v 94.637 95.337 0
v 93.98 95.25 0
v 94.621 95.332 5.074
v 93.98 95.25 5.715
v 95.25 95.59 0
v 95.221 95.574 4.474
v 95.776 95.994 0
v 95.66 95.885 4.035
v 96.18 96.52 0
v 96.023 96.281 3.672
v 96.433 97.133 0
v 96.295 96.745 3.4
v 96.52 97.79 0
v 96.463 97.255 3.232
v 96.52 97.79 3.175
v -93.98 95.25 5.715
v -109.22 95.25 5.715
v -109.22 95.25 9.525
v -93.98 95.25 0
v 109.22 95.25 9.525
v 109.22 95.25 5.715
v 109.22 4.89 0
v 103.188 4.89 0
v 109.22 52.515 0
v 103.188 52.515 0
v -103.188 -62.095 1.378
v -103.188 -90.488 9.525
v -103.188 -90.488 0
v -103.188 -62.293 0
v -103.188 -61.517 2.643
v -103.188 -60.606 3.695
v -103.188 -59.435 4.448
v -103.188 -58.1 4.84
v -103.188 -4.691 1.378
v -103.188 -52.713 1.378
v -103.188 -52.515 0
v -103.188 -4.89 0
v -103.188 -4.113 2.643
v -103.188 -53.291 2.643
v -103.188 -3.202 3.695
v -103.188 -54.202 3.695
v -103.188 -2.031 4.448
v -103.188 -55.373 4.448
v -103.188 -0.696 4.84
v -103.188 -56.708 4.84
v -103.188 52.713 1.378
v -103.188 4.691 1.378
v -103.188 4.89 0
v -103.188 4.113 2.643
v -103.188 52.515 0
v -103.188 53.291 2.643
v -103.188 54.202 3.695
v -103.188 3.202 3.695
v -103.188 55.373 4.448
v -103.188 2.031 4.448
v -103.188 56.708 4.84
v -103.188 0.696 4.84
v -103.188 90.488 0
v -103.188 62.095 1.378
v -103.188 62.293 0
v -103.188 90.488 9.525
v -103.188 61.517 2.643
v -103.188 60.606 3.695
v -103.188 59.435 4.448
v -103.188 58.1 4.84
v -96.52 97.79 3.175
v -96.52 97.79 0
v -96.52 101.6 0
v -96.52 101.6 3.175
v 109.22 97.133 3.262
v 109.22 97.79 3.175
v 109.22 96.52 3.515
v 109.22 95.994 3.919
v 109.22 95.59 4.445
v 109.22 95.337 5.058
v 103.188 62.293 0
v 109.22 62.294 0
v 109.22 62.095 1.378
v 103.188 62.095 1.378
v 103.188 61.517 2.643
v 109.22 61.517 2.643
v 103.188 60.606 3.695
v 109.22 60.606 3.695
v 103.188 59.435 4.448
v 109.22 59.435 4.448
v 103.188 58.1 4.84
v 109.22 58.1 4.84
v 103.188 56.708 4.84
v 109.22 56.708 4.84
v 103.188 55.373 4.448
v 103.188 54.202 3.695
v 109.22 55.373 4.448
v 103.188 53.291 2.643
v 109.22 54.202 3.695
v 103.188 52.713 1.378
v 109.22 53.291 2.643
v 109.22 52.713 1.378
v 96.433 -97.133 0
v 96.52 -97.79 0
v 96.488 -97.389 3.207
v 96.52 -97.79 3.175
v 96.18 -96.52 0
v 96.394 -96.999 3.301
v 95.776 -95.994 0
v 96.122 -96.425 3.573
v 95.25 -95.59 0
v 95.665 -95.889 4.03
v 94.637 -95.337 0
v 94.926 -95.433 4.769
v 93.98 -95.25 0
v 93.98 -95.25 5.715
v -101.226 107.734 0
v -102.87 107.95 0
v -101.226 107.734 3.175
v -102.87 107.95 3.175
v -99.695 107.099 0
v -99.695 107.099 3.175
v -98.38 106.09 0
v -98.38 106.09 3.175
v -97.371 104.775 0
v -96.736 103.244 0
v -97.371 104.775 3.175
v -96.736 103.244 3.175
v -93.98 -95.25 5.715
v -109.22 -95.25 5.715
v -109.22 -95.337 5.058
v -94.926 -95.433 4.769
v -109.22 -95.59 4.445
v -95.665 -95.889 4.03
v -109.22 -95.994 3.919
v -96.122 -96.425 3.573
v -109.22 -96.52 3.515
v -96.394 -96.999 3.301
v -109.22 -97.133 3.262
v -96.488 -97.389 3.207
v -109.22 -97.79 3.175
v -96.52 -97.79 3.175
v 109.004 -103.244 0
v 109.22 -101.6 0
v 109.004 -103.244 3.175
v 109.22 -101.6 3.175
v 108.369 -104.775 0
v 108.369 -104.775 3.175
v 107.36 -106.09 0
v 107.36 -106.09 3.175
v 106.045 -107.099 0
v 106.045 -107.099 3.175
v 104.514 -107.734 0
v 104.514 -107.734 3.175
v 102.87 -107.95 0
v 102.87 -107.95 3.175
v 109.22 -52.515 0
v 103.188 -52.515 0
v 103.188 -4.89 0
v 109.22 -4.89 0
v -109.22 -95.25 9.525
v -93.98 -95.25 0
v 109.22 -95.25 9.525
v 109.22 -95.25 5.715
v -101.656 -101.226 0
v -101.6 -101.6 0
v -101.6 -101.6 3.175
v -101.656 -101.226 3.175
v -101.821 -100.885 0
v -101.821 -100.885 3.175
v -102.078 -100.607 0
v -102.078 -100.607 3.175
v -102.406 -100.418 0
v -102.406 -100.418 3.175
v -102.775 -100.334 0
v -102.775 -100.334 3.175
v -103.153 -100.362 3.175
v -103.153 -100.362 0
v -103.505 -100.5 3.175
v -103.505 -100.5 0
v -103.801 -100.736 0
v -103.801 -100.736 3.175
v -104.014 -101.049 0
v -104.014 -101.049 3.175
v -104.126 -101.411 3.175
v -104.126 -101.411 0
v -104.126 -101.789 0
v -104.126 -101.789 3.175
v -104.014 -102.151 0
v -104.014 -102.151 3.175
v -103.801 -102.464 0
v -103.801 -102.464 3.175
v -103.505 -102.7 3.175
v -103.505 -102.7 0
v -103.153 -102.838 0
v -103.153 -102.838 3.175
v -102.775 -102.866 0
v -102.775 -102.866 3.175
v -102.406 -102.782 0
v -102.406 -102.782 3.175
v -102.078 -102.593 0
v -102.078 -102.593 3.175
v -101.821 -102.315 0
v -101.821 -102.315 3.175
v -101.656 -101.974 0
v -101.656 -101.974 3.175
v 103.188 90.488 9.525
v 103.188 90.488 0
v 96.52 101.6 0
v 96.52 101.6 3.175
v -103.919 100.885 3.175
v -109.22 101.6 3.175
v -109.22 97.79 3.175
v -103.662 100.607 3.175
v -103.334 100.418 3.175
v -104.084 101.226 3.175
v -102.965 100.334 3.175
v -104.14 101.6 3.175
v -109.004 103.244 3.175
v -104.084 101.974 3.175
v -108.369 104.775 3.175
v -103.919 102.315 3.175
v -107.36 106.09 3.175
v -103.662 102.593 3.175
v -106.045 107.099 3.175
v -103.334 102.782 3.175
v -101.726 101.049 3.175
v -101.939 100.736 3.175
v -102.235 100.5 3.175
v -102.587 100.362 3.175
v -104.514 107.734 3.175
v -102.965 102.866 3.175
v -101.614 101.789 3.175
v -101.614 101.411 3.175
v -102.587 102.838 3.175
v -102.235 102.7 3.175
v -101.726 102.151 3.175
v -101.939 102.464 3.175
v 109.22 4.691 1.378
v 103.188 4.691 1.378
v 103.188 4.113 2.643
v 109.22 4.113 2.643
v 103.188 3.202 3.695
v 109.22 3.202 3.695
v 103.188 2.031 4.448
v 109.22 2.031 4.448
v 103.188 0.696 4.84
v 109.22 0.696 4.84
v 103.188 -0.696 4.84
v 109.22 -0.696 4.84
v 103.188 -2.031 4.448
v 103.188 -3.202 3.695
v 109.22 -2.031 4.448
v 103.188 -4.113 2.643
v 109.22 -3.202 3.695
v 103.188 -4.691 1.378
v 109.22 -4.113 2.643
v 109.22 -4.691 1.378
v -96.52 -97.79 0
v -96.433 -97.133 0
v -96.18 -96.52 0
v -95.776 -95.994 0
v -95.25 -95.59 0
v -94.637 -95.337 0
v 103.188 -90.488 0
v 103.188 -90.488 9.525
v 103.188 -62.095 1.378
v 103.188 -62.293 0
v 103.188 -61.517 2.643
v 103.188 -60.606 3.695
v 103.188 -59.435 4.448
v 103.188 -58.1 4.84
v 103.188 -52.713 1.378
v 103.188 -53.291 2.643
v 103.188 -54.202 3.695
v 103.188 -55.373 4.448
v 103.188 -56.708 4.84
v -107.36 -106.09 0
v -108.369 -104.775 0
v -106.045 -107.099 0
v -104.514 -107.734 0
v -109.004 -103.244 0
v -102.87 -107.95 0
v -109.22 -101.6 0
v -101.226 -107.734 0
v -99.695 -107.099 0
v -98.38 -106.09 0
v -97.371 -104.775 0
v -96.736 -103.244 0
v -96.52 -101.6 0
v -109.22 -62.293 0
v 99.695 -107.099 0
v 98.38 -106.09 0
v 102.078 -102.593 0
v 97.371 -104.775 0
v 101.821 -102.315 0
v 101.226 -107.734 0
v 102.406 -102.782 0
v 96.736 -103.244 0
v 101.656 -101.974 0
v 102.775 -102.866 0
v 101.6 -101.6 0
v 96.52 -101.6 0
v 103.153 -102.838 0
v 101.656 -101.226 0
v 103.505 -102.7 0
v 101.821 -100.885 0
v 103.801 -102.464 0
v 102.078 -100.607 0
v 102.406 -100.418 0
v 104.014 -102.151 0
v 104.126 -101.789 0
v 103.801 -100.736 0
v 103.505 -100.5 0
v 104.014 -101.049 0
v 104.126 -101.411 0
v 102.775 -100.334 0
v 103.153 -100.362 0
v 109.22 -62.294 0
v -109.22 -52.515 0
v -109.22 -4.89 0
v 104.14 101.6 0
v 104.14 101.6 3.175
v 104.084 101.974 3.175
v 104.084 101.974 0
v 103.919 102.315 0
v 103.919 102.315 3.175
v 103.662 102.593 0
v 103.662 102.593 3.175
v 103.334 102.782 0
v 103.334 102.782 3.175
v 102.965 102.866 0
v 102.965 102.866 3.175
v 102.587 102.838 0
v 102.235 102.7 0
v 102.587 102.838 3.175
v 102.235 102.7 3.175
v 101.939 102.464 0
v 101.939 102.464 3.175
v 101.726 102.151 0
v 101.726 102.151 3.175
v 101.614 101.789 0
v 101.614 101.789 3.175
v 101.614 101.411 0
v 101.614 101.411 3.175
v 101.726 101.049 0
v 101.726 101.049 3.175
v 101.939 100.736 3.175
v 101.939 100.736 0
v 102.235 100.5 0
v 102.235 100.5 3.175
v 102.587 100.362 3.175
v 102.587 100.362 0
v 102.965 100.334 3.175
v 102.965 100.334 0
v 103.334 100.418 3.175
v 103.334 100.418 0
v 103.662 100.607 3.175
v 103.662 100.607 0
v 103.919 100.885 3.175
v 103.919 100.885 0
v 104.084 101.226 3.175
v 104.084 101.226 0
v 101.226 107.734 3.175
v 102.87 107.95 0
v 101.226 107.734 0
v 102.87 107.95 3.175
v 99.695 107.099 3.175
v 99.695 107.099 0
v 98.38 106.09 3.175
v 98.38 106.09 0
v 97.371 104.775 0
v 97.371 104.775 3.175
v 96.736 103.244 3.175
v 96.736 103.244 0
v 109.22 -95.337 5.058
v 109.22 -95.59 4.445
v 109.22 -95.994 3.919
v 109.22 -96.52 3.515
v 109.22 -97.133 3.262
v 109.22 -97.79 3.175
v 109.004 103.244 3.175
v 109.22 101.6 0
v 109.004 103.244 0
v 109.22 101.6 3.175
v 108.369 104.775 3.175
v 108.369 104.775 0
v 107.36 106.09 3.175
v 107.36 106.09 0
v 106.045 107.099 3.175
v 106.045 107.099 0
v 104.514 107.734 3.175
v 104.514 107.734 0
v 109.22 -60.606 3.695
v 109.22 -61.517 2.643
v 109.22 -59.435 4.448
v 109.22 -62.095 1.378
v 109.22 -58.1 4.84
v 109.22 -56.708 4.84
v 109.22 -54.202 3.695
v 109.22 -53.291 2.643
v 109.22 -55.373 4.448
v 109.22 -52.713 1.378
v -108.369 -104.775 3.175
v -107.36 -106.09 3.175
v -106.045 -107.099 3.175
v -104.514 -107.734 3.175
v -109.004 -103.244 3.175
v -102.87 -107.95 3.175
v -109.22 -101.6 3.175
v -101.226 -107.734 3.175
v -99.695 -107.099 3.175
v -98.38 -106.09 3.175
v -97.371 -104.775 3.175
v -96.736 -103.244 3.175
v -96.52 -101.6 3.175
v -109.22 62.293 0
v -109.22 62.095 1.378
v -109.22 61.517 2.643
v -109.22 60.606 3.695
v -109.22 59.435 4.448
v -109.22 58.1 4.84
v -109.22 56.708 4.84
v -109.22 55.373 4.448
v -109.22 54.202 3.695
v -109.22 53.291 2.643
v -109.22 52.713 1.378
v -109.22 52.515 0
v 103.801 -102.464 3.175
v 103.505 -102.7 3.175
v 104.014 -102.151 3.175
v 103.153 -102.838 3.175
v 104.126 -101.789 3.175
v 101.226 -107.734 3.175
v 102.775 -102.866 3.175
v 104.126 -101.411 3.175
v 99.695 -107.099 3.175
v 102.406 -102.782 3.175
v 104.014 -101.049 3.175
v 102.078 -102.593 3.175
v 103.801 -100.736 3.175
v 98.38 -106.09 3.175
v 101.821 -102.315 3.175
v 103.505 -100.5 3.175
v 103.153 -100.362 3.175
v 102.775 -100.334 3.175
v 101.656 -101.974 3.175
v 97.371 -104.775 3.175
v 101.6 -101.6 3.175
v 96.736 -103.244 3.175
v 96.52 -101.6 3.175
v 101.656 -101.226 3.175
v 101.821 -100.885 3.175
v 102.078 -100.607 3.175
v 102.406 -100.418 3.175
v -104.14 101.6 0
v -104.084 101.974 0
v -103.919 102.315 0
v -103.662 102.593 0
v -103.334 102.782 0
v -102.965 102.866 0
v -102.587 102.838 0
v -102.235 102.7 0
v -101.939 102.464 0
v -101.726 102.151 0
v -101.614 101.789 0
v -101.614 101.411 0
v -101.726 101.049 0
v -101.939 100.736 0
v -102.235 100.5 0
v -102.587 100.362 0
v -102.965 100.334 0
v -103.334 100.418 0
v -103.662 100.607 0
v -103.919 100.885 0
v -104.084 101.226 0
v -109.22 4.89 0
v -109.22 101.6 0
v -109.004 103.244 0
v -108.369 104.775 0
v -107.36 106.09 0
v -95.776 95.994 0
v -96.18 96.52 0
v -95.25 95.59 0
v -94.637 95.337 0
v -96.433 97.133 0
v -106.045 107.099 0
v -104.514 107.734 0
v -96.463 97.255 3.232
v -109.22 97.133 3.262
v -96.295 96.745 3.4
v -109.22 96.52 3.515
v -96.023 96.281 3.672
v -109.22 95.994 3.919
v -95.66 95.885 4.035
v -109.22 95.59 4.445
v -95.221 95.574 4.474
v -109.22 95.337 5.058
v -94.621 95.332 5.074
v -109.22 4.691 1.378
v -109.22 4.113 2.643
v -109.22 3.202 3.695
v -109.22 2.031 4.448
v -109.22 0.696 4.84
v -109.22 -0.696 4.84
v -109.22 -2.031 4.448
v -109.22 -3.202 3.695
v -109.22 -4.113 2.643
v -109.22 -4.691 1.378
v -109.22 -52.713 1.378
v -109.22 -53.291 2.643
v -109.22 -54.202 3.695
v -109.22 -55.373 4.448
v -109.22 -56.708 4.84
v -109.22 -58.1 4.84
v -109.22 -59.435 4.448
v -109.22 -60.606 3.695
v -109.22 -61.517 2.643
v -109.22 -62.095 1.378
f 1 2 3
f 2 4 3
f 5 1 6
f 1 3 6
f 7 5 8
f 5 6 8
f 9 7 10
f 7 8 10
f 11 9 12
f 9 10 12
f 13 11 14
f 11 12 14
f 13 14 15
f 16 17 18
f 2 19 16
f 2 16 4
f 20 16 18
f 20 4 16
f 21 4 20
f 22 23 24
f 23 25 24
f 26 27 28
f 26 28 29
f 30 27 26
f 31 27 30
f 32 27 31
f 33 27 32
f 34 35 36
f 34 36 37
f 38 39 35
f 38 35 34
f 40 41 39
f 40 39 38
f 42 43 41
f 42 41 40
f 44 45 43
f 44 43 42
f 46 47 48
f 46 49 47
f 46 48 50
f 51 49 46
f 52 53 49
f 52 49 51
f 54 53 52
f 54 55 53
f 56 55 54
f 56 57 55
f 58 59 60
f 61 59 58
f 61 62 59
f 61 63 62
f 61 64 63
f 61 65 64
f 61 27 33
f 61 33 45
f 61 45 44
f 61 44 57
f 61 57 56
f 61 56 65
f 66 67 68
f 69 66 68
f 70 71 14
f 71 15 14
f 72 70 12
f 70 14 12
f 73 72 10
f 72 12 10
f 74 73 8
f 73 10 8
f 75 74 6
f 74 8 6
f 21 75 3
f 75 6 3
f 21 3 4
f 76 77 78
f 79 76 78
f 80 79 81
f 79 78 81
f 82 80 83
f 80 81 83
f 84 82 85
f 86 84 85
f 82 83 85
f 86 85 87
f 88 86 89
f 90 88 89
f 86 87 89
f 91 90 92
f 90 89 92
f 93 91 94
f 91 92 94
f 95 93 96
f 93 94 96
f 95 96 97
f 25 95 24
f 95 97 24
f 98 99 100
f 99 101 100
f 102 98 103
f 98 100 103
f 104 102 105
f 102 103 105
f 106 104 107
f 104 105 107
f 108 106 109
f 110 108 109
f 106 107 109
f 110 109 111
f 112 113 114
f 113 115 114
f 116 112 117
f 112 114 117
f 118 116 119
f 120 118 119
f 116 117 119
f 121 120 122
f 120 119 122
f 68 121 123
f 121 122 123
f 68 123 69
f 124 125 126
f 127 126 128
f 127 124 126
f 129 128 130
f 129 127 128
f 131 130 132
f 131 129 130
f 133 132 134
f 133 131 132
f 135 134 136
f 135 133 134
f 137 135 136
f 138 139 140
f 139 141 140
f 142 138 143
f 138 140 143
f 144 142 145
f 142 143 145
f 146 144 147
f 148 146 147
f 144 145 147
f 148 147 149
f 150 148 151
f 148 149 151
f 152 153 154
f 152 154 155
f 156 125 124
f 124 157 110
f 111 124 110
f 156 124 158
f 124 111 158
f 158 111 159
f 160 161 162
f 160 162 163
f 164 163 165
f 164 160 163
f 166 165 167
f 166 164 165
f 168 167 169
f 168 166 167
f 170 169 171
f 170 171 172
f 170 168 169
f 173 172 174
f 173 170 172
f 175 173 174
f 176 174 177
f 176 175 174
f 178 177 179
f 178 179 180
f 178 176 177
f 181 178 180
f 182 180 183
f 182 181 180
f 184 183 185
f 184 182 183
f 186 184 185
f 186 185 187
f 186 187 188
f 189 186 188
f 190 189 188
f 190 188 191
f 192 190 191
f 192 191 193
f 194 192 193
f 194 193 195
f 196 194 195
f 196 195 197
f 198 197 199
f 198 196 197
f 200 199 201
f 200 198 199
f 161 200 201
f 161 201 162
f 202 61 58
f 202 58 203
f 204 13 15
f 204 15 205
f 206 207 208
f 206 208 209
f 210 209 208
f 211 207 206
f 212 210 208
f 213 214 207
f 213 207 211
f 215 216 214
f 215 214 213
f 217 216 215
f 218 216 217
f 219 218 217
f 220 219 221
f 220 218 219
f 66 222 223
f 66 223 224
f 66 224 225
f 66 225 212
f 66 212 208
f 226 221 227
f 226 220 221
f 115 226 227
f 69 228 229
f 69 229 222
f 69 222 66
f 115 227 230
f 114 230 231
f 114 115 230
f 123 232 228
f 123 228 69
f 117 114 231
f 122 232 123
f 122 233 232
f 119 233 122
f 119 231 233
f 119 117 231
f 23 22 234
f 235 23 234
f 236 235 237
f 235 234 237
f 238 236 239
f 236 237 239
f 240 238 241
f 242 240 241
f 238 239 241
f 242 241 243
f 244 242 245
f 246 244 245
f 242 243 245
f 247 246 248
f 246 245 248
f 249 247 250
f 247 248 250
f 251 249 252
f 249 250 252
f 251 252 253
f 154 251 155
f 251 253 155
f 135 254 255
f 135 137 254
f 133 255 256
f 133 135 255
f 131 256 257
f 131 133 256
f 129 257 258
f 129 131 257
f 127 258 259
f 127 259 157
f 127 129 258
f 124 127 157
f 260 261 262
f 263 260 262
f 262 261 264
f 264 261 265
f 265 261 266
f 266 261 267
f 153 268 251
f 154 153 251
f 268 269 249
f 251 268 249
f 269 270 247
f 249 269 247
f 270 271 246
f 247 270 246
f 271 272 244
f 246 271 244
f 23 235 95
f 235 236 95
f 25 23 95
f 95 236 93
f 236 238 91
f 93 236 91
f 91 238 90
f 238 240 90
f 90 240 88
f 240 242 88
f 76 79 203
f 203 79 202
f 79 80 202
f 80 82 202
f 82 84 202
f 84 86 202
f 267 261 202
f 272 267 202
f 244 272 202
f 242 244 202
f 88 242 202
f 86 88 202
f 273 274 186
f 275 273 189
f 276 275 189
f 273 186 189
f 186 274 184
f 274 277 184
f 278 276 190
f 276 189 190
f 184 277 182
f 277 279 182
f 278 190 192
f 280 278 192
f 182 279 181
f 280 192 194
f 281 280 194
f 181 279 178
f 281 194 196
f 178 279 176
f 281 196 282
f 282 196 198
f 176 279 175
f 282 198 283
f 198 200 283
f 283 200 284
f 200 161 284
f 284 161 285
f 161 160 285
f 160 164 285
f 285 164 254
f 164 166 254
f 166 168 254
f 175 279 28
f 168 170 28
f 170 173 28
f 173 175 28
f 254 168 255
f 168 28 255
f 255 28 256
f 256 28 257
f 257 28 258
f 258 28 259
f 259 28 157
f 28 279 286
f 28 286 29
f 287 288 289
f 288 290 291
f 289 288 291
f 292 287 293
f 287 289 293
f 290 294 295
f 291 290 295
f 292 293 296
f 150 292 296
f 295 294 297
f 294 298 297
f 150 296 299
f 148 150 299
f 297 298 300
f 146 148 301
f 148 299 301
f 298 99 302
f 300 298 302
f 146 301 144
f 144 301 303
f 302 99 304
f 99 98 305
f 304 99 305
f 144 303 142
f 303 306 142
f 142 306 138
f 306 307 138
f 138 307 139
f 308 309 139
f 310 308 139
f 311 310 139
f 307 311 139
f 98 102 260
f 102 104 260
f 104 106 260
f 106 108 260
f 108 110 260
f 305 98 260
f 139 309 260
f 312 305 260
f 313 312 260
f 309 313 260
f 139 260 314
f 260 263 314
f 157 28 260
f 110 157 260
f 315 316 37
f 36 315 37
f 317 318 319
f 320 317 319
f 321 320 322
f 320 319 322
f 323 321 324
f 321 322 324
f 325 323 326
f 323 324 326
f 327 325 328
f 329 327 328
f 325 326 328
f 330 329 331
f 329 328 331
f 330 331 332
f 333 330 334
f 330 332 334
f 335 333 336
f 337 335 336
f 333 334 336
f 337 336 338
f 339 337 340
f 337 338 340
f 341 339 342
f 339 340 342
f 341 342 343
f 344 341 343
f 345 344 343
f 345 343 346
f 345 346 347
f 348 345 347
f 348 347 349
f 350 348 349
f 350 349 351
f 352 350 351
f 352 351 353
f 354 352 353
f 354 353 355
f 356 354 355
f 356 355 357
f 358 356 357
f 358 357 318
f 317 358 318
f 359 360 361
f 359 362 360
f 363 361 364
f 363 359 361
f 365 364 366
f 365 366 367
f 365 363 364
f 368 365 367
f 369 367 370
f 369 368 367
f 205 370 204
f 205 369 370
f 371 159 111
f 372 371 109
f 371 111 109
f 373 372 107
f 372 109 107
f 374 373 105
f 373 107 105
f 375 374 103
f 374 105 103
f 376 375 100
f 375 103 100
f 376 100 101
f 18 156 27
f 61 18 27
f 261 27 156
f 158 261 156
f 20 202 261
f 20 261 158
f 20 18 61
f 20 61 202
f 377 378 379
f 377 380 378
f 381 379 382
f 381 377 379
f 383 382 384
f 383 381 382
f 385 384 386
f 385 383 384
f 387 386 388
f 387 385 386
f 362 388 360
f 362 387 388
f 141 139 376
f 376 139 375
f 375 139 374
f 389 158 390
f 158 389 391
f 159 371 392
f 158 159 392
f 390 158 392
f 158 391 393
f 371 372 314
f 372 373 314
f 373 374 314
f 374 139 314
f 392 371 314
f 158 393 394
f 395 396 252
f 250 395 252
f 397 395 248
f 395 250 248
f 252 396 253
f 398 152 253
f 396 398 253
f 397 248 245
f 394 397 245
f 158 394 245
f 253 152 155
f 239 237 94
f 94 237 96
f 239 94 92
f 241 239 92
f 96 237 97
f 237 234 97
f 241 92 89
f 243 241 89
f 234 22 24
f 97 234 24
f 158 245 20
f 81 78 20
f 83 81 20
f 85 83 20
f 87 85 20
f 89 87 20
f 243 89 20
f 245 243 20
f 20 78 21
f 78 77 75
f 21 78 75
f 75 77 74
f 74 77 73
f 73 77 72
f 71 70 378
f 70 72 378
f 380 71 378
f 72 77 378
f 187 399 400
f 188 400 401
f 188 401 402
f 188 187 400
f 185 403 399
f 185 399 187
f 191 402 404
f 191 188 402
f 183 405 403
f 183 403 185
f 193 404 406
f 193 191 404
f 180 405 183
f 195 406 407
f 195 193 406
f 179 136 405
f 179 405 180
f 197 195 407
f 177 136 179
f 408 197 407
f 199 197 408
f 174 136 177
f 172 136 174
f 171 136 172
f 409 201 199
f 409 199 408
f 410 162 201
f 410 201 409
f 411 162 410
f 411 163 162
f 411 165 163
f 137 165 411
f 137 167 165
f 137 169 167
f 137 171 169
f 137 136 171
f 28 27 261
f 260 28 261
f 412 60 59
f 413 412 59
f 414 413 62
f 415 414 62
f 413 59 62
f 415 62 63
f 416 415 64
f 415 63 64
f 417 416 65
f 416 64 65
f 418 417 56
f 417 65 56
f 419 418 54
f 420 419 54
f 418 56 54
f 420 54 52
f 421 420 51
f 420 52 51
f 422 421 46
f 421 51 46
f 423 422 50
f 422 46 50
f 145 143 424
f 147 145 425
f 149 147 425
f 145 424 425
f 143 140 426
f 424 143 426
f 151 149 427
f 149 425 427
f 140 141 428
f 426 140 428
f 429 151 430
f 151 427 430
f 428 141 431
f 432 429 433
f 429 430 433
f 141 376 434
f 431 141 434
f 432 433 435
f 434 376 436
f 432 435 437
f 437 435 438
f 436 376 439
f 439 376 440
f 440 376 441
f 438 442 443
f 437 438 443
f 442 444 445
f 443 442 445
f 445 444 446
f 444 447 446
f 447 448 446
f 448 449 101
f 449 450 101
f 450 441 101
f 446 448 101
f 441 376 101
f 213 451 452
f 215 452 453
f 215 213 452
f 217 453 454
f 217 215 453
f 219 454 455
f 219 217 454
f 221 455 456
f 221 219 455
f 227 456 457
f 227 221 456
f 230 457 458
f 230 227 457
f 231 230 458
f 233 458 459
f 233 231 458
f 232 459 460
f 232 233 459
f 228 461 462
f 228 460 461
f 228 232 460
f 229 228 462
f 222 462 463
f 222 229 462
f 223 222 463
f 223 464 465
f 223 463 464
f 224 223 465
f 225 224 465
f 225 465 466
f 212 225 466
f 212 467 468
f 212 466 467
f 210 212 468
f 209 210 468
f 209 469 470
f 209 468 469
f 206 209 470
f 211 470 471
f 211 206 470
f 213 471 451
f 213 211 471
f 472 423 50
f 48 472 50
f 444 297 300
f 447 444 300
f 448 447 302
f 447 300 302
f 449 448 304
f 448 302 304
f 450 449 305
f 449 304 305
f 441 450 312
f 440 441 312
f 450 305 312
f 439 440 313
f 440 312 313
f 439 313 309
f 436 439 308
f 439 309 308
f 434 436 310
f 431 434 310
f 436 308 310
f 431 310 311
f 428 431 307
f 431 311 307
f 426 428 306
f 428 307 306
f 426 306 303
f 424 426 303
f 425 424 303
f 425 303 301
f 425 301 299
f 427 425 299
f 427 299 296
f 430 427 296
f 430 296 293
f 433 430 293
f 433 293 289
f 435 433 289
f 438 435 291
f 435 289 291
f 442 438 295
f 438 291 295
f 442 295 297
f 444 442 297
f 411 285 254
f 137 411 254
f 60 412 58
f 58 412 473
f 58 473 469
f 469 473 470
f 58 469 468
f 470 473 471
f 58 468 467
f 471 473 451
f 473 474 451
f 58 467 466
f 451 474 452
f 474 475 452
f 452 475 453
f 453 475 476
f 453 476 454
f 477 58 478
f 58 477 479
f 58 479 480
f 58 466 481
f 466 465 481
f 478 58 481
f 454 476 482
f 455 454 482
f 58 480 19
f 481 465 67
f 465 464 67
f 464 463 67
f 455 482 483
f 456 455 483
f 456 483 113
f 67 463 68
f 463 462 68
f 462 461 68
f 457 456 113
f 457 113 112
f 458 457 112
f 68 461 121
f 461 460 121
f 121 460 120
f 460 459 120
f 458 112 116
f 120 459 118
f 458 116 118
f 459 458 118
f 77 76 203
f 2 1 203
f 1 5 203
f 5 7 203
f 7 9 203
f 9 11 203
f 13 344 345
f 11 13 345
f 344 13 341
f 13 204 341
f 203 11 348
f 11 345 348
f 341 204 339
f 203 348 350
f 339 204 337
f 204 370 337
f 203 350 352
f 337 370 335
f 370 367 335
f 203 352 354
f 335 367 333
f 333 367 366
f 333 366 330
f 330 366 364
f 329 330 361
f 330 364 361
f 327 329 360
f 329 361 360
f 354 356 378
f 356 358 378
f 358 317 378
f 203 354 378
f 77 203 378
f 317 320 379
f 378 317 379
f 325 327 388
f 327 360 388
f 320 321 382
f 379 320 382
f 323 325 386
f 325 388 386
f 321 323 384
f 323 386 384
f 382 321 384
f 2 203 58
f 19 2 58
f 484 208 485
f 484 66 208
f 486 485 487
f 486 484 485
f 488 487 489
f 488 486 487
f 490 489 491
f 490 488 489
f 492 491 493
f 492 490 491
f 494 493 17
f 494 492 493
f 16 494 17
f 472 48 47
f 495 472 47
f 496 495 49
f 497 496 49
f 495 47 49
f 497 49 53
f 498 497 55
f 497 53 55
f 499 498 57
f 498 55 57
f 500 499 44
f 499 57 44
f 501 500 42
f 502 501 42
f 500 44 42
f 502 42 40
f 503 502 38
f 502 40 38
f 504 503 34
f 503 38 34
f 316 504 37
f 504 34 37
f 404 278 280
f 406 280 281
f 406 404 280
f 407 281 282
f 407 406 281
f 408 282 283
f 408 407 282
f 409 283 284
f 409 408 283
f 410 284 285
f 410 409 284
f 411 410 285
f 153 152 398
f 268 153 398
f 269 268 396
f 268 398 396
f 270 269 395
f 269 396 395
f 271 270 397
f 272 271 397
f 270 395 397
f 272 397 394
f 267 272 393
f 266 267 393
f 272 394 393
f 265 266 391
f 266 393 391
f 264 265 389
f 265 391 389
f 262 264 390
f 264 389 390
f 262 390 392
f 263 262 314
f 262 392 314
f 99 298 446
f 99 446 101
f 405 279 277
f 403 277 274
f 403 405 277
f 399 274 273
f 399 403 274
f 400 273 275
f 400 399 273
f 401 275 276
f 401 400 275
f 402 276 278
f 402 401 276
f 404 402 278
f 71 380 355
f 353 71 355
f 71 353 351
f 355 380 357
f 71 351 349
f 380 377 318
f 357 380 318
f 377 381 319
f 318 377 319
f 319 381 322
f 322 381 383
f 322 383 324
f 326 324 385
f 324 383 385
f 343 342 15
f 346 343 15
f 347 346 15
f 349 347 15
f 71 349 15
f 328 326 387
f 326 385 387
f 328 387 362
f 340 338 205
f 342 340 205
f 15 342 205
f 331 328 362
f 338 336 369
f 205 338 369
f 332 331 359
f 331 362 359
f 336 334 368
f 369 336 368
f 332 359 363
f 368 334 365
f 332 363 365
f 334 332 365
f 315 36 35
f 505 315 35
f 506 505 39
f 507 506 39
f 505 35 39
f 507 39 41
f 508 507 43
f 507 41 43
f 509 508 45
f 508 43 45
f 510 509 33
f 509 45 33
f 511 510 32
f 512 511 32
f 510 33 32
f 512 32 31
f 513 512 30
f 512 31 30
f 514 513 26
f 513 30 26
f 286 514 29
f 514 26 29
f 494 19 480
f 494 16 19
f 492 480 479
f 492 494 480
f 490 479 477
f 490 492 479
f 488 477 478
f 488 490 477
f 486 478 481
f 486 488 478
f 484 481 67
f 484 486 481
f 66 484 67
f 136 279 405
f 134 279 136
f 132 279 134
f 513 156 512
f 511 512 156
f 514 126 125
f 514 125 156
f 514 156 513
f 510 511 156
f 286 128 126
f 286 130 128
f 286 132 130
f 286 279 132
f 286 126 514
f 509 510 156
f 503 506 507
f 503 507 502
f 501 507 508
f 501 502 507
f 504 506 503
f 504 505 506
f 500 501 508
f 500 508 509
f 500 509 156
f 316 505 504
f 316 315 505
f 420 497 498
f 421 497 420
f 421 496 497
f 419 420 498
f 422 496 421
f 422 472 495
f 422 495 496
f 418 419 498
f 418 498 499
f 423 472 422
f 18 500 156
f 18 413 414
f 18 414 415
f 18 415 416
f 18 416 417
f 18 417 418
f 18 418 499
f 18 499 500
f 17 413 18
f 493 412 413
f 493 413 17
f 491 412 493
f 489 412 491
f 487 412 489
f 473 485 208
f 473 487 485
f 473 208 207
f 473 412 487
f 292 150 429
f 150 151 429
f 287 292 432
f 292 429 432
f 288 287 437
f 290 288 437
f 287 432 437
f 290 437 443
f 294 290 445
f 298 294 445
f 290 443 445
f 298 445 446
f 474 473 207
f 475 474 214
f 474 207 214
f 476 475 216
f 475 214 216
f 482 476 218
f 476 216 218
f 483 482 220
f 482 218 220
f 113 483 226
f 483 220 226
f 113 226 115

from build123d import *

# Parameters (mm, degrees)
SKETCH1_W            = 218.44
SKETCH1_H            = 190.5
BOSS_EXTRUDE1_DEPTH  = 9.525
SKETCH2_W            = 206.375
SKETCH2_H            = 180.975
CUT_EXTRUDE1_DEPTH   = 9.525
SKETCH3_R            = 4.8895
CUT_EXTRUDE2_DEPTH   = 239.49386098
SKETCH4_W            = 12.7
SKETCH4_H            = 12.7
BOSS_EXTRUDE2_DEPTH  = 3.175
SKETCH5_R            = 1.27
CUT_EXTRUDE3_DEPTH   = 154.69623743
FILLET1_R            = 6.35
FILLET2_R            = 2.54
FILLET1_OF_MIRROR1_R = 6.35
FILLET2_OF_MIRROR1_R = 2.54
SKETCH6_W            = 12.7
SKETCH6_H            = 12.7
SKETCH6_R            = 1.27
BOSS_EXTRUDE3_DEPTH  = 3.175
FILLET3_R            = 2.54
FILLET4_R            = 6.35
FILLET3_OF_MIRROR7_R = 2.54
FILLET4_OF_MIRROR7_R = 6.35


with BuildPart() as part:
    # Sketch1 → Boss-Extrude1 (new body)
    with BuildSketch(Plane.XY):
        Rectangle(SKETCH1_W, SKETCH1_H)
    extrude(amount=BOSS_EXTRUDE1_DEPTH)

    # Sketch2 → Cut-Extrude1 (cut)
    with BuildSketch(Plane.XY.offset(9.525)):
        Rectangle(SKETCH2_W, SKETCH2_H)
    extrude(amount=-CUT_EXTRUDE1_DEPTH, mode=Mode.SUBTRACT)

    # Sketch3 → Cut-Extrude2 (cut, through all)
    with BuildSketch(Plane(origin=(109.22, 0, 0), x_dir=(0, 0, -1), z_dir=(1, 0, 0))):
        Circle(SKETCH3_R)
        with Locations((0, 57.404)):
            Circle(SKETCH3_R)
        with Locations((0, -57.404)):
            Circle(SKETCH3_R)
    extrude(amount=-CUT_EXTRUDE2_DEPTH, mode=Mode.SUBTRACT)

    # Sketch4 → Boss-Extrude2 (add)
    with BuildSketch(Plane(origin=(0, 0, 0), x_dir=(-1, 0, 0), z_dir=(0, 0, -1))):
        with Locations((-102.87, 101.6)):
            Rectangle(SKETCH4_W, SKETCH4_H)
    boss_extrude2 = extrude(amount=-BOSS_EXTRUDE2_DEPTH)

    # Sketch5 → Cut-Extrude3 (cut, through all)
    with BuildSketch(Plane.XY.offset(3.175)):
        with Locations((102.87, 101.6)):
            Circle(SKETCH5_R)
    cut_extrude3 = extrude(amount=-CUT_EXTRUDE3_DEPTH, mode=Mode.SUBTRACT)

    # Fillet1
    fillet1_edges = [part.edges().sort_by_distance(p)[0] for p in [
        (96.52, 107.95, 1.5875),
        (109.22, 107.95, 1.5875),
    ]]
    fillet(fillet1_edges, radius=FILLET1_R - 0.0001)  # a hair under: the kernel refuses the full size

    # Fillet2
    fillet2_edges = [part.edges().sort_by_distance(p)[0] for p in [
        (102.87, 95.25, 3.175),
        (96.52, 95.25, 1.5875),
    ]]
    fillet(fillet2_edges, radius=FILLET2_R)

    # Mirror1: Boss-Extrude2, Cut-Extrude3 across plane
    add(boss_extrude2.mirror(Plane(origin=(0, 0, 0), x_dir=(0, 0, 1), z_dir=(1, 0, 0))))
    add(cut_extrude3.mirror(Plane(origin=(0, 0, 0), x_dir=(0, 0, 1), z_dir=(1, 0, 0))), mode=Mode.SUBTRACT)

    # Fillet1 of Mirror1
    fillet1_of_mirror1_edges = [part.edges().sort_by_distance(p)[0] for p in [
        (-96.52, 107.95, 1.5875),
        (-109.22, 107.95, 1.5875),
    ]]
    fillet(fillet1_of_mirror1_edges, radius=FILLET1_OF_MIRROR1_R - 0.0001)  # a hair under: the kernel refuses the full size

    # Fillet2 of Mirror1
    fillet2_of_mirror1_edges = [part.edges().sort_by_distance(p)[0] for p in [
        (-102.87, 95.25, 3.175),
        (-96.52, 95.25, 1.5875),
    ]]
    fillet(fillet2_of_mirror1_edges, radius=FILLET2_OF_MIRROR1_R)

    # Sketch6 → Boss-Extrude3 (add)
    with BuildSketch(Plane(origin=(0, 0, 0), x_dir=(-1, 0, 0), z_dir=(0, 0, -1))):
        with Locations((-102.87, -101.6)):
            Rectangle(SKETCH6_W, SKETCH6_H)
        with Locations((-102.87, -101.6)):
            Circle(SKETCH6_R, mode=Mode.SUBTRACT)
    boss_extrude3 = extrude(amount=-BOSS_EXTRUDE3_DEPTH)

    # Fillet3
    fillet3_edges = [part.edges().sort_by_distance(p)[0] for p in [
        (102.87, -95.25, 3.175),
        (96.52, -95.25, 1.5875),
    ]]
    fillet(fillet3_edges, radius=FILLET3_R)

    # Fillet4
    fillet4_edges = [part.edges().sort_by_distance(p)[0] for p in [
        (109.22, -107.95, 1.5875),
        (96.52, -107.95, 1.5875),
    ]]
    fillet(fillet4_edges, radius=FILLET4_R - 0.0001)  # a hair under: the kernel refuses the full size

    # Mirror7: Boss-Extrude3 across plane
    add(boss_extrude3.mirror(Plane(origin=(0, 0, 0), x_dir=(0, 0, 1), z_dir=(1, 0, 0))))

    # Fillet3 of Mirror7
    fillet3_of_mirror7_edges = [part.edges().sort_by_distance(p)[0] for p in [
        (-102.87, -95.25, 3.175),
        (-96.52, -95.25, 1.5875),
    ]]
    fillet(fillet3_of_mirror7_edges, radius=FILLET3_OF_MIRROR7_R)

    # Fillet4 of Mirror7
    fillet4_of_mirror7_edges = [part.edges().sort_by_distance(p)[0] for p in [
        (-109.22, -107.95, 1.5875),
        (-96.52, -107.95, 1.5875),
    ]]
    fillet(fillet4_of_mirror7_edges, radius=FILLET4_OF_MIRROR7_R - 0.0001)  # a hair under: the kernel refuses the full size


solid = part.part
